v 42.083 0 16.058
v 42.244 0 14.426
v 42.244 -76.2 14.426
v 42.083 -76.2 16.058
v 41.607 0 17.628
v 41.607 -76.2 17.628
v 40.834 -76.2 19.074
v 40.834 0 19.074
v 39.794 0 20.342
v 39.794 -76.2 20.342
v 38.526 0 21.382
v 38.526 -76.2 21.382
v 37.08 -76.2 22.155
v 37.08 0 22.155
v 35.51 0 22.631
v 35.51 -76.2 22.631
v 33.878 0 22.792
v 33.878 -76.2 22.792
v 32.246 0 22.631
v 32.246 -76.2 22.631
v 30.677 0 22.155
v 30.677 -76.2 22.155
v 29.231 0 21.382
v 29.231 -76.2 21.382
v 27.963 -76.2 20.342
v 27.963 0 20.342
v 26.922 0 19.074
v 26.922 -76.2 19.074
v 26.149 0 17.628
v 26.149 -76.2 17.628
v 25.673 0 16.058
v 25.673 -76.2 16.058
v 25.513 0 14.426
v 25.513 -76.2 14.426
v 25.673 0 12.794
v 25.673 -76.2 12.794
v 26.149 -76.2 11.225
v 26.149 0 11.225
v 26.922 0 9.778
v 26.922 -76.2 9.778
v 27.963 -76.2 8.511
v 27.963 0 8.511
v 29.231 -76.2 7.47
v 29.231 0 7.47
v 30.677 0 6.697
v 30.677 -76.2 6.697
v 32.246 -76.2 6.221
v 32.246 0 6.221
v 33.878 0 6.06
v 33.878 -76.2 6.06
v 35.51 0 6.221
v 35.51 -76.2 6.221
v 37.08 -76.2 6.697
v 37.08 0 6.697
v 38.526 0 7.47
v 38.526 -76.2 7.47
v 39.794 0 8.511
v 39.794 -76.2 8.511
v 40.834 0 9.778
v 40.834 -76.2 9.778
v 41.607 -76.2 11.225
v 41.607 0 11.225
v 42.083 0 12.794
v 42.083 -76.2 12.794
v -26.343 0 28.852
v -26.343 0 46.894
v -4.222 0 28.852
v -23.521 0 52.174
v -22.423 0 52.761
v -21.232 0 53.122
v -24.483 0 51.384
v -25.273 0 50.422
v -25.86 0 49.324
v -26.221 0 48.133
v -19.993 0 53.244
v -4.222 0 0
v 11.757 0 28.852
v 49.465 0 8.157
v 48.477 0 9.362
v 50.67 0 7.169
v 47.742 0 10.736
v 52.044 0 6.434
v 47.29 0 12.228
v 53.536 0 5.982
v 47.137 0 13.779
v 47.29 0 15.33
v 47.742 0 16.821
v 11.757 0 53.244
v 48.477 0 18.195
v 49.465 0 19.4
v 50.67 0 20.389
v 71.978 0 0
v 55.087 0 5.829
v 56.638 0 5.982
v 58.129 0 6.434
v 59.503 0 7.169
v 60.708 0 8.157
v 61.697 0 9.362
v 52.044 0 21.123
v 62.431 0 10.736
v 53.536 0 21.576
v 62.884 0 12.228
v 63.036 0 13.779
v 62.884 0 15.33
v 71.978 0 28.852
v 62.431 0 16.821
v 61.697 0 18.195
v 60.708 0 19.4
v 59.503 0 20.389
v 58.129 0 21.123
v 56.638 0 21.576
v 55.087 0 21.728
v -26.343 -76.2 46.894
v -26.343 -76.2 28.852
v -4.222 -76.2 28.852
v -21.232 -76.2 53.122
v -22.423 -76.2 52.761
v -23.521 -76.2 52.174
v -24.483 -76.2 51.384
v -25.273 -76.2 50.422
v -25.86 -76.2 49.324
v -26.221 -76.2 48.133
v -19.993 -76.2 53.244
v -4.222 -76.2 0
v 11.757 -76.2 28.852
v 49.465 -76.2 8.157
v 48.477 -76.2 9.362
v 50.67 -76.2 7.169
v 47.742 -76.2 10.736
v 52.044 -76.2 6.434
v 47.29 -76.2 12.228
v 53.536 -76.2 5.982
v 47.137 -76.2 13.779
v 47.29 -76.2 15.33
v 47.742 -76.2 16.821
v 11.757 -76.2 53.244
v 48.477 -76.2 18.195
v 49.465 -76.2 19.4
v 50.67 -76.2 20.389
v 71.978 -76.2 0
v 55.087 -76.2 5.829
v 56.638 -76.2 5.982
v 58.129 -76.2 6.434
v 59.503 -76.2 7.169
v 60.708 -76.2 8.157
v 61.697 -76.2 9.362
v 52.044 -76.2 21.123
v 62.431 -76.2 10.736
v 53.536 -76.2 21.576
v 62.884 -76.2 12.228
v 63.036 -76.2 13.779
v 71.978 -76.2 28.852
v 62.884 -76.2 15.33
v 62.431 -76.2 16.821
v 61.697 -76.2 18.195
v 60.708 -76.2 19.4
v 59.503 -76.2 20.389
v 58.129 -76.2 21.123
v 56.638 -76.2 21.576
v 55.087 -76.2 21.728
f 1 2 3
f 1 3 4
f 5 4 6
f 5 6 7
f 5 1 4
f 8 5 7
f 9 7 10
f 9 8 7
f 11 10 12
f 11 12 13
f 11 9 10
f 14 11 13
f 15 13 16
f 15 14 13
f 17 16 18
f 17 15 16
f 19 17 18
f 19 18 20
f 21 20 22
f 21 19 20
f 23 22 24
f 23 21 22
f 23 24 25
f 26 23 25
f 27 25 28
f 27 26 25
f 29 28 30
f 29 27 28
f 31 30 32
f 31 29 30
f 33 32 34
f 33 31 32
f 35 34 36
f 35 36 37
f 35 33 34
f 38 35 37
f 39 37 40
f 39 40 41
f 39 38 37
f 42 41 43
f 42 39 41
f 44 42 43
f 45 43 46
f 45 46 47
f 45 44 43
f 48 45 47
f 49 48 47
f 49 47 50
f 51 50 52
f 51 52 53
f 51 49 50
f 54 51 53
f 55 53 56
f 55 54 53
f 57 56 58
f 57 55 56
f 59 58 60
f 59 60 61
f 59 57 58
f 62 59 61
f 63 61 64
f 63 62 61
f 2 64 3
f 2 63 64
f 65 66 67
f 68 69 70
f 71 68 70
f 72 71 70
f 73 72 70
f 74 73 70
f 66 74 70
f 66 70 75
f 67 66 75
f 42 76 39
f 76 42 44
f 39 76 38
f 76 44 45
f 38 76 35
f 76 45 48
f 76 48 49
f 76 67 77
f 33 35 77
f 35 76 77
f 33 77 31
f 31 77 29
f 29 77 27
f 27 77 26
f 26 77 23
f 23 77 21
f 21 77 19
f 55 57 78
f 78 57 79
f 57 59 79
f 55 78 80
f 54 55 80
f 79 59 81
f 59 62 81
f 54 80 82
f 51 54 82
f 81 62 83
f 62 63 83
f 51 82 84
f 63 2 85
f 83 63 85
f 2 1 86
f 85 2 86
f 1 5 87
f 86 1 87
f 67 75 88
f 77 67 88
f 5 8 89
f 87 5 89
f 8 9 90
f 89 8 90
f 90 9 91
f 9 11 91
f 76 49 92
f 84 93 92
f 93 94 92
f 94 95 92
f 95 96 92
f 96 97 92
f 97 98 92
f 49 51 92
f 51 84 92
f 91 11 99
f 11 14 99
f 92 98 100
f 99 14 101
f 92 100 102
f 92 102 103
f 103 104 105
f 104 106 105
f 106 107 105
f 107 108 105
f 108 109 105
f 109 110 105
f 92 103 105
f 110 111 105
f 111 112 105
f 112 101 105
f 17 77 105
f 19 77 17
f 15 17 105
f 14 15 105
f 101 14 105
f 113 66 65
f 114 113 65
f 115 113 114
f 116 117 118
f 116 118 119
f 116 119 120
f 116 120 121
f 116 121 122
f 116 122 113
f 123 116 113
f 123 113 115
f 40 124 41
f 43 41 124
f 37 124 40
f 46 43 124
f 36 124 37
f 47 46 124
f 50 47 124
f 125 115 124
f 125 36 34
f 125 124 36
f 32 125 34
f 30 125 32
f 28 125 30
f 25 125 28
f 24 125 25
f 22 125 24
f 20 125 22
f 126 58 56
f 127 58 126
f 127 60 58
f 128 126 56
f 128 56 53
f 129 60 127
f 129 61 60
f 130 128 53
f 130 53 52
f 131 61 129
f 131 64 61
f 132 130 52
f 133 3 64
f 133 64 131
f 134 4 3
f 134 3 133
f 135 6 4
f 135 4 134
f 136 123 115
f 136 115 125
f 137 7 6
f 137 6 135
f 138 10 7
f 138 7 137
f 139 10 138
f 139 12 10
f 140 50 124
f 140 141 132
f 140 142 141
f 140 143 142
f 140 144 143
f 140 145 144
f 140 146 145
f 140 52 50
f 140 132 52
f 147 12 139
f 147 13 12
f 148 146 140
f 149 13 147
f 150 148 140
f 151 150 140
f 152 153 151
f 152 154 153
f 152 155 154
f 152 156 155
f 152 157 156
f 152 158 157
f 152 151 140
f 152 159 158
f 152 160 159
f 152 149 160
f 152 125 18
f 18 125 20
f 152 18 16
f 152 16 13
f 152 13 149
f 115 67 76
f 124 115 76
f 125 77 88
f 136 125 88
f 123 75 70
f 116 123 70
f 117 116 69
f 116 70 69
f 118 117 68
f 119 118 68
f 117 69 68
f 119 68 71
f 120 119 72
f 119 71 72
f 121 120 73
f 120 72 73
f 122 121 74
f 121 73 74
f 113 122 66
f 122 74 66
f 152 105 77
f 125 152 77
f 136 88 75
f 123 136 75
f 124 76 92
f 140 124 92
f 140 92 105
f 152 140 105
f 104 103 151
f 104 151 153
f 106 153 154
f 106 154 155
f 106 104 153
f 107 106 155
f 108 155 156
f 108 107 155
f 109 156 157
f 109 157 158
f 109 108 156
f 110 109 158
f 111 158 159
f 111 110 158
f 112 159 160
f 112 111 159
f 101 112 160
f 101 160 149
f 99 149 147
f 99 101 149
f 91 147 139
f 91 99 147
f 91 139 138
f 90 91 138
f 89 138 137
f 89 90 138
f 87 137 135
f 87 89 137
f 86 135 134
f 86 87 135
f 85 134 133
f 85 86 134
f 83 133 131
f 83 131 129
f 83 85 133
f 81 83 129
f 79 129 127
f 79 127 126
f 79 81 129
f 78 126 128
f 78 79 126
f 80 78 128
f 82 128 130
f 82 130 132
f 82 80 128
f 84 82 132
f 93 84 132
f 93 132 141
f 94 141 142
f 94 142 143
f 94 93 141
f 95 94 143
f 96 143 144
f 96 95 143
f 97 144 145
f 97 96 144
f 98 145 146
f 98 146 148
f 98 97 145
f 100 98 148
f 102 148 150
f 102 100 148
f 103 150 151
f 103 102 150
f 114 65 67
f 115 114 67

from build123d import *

# Parameters (mm, degrees)
F0_R     = 8.365692
F0_R_2   = 7.949673
F1_DEPTH = 76.2


with BuildPart() as f1:
    # F0 (on Front) → F1 (new body)
    with BuildSketch(Plane.XZ):
        Polygon((-4.221705, 28.852343), (-4.221705, 0), (71.978295, 0), (71.978295, 28.852343), (11.756951, 28.852343), align=None)
        with Locations((33.878295, 14.426172)):
            Circle(F0_R, mode=Mode.SUBTRACT)
        with Locations((55.086598, 13.778679)):
            Circle(F0_R_2, mode=Mode.SUBTRACT)
        with BuildLine():
            Line((-26.343049, 28.852343), (-4.221705, 28.852343))
            Line((-4.221705, 28.852343), (11.756951, 28.852343))
            Line((11.756951, 28.852343), (11.756951, 53.244089))
            Line((11.756951, 53.244089), (-19.993049, 53.244089))
            ThreePointArc((-19.993049, 53.244089), (-24.483177, 51.384217), (-26.343049, 46.894089))
            Line((-26.343049, 46.894089), (-26.343049, 28.852343))
        make_face()
    extrude(amount=F1_DEPTH)


solid = f1.part
